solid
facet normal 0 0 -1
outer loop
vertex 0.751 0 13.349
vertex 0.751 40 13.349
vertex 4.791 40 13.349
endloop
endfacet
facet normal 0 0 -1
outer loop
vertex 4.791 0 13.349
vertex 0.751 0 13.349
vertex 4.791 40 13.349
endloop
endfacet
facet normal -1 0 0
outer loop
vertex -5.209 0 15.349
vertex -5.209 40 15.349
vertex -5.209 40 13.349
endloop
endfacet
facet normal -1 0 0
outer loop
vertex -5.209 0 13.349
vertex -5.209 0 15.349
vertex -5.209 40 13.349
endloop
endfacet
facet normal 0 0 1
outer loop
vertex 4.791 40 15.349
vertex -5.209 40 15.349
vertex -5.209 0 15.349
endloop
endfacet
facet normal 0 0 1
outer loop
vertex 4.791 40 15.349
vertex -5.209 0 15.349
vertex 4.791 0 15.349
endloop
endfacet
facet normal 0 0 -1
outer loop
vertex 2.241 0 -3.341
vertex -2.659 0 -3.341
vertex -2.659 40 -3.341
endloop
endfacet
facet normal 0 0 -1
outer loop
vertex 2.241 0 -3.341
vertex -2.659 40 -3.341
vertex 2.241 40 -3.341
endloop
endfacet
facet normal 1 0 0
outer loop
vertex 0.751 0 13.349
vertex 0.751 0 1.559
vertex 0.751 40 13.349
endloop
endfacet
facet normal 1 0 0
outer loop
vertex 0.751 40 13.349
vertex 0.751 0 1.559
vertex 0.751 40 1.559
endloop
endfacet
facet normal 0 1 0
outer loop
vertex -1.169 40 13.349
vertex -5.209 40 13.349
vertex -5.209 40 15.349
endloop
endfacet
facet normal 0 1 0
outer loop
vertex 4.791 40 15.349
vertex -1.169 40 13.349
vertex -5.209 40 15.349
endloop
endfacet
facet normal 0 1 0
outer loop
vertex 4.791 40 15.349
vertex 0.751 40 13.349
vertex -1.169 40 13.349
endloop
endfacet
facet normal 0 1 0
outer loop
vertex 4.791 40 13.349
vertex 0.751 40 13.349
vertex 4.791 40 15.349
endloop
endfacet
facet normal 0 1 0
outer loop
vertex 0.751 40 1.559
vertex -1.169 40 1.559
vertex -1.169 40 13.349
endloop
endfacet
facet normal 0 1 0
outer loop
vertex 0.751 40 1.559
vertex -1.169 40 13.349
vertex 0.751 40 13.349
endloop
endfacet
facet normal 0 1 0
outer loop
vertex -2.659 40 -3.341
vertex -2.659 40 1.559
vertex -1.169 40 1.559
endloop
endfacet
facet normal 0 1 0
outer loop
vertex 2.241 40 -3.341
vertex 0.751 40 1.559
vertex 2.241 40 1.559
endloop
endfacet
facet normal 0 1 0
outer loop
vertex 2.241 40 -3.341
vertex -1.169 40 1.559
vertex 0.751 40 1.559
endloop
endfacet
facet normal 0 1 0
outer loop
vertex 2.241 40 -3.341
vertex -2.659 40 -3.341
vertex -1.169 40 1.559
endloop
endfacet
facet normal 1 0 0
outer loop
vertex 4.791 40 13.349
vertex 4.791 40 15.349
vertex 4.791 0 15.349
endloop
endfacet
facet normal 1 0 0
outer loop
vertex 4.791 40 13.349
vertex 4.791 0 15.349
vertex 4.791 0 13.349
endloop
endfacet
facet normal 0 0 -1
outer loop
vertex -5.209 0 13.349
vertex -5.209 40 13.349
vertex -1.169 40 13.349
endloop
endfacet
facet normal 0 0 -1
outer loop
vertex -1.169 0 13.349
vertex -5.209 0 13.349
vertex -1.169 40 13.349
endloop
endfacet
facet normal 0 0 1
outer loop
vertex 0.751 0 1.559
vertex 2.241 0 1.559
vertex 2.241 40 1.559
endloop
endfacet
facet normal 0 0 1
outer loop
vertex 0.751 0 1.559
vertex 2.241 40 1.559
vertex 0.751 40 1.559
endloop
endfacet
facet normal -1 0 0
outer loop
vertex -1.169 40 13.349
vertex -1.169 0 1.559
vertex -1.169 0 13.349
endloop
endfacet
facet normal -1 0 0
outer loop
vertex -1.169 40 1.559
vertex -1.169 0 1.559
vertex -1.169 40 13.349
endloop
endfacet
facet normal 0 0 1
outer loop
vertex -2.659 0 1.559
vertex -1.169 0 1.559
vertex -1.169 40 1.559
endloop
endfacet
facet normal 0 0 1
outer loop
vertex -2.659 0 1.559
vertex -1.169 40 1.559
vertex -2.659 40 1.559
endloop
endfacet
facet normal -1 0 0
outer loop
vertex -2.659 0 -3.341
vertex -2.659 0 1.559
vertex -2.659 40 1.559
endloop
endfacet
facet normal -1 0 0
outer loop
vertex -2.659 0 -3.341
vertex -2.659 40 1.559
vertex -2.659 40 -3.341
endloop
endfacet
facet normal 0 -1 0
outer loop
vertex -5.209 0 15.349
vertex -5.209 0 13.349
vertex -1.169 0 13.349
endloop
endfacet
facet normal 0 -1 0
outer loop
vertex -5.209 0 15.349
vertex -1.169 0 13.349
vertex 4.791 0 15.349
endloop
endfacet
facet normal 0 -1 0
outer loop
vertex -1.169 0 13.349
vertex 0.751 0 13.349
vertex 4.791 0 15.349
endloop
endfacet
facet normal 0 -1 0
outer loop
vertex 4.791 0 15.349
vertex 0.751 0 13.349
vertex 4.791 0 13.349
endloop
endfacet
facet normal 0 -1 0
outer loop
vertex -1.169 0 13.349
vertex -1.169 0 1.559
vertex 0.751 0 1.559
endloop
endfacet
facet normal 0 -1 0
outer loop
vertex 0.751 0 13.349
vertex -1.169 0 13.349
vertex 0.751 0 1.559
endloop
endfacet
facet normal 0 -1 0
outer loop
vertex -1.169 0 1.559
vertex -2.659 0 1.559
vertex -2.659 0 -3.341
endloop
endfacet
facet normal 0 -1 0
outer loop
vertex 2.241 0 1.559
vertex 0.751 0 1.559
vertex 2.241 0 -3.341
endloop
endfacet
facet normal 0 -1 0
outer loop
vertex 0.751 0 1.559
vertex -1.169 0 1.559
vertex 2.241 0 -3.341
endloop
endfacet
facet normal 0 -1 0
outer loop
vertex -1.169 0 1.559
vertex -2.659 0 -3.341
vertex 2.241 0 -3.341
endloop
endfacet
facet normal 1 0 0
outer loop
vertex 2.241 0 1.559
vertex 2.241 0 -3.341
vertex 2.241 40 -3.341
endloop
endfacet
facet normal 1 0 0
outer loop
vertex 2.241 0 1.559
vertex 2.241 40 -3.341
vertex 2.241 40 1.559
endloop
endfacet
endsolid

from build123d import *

# Parameters (mm, degrees)
EXTRUDE_1_DEPTH = 40
SKETCH_3_W      = 1.92
SKETCH_3_H      = 1.335454545
EXTRUDE_2_DEPTH = 40
SKETCH_4_W      = 1.92
SKETCH_4_H      = 40
EXTRUDE_3_DEPTH = 1
SKETCH_5_W      = 1.92
SKETCH_5_H      = 40
EXTRUDE_4_DEPTH = 10
SKETCH_7_W      = 10
SKETCH_7_H      = 2
EXTRUDE_5_DEPTH = 40


with BuildPart() as part:
    # 草圖2 → 填料-伸長1 (new body)
    with BuildSketch(Plane(origin=(0, 0, 0), x_dir=(1, 0, 0), z_dir=(0, 1, 0))):
        Polygon((-1.169090909, -3.013636364), (-1.169090909, -1.559090909), (-2.659090909, -1.559090909), (-2.659090909, 3.340909091), (2.240909091, 3.340909091), (2.240909091, -1.559090909), (0.750909091, -1.559090909), (0.750909091, -3.013636364), align=None)
    extrude(amount=EXTRUDE_1_DEPTH)

    # 草圖3 → 填料-伸長2 (add)
    with BuildSketch(Plane(origin=(0, 40, 0), x_dir=(1, 0, 0), z_dir=(0, 1, 0))):
        with Locations((-0.209090909, -3.681363637)):
            Rectangle(SKETCH_3_W, SKETCH_3_H)
    extrude(amount=-EXTRUDE_2_DEPTH)

    # 草圖4 → 填料-伸長3 (add)
    with BuildSketch(Plane.XY.offset(4.349090909)):
        with Locations((-0.209090909, 20)):
            Rectangle(SKETCH_4_W, SKETCH_4_H)
    extrude(amount=EXTRUDE_3_DEPTH)

    # 草圖5 → 填料-伸長4 (add)
    with BuildSketch(Plane.XY.offset(5.349090909)):
        with Locations((-0.209090909, 20)):
            Rectangle(SKETCH_5_W, SKETCH_5_H)
    extrude(amount=EXTRUDE_4_DEPTH)

    # 草圖7 → 填料-伸長5 (add)
    with BuildSketch(Plane(origin=(0, 40, 0), x_dir=(1, 0, 0), z_dir=(0, 1, 0))):
        with Locations((-0.209090909, -14.349090909)):
            Rectangle(SKETCH_7_W, SKETCH_7_H)
    extrude(amount=-EXTRUDE_5_DEPTH)


solid = part.part
